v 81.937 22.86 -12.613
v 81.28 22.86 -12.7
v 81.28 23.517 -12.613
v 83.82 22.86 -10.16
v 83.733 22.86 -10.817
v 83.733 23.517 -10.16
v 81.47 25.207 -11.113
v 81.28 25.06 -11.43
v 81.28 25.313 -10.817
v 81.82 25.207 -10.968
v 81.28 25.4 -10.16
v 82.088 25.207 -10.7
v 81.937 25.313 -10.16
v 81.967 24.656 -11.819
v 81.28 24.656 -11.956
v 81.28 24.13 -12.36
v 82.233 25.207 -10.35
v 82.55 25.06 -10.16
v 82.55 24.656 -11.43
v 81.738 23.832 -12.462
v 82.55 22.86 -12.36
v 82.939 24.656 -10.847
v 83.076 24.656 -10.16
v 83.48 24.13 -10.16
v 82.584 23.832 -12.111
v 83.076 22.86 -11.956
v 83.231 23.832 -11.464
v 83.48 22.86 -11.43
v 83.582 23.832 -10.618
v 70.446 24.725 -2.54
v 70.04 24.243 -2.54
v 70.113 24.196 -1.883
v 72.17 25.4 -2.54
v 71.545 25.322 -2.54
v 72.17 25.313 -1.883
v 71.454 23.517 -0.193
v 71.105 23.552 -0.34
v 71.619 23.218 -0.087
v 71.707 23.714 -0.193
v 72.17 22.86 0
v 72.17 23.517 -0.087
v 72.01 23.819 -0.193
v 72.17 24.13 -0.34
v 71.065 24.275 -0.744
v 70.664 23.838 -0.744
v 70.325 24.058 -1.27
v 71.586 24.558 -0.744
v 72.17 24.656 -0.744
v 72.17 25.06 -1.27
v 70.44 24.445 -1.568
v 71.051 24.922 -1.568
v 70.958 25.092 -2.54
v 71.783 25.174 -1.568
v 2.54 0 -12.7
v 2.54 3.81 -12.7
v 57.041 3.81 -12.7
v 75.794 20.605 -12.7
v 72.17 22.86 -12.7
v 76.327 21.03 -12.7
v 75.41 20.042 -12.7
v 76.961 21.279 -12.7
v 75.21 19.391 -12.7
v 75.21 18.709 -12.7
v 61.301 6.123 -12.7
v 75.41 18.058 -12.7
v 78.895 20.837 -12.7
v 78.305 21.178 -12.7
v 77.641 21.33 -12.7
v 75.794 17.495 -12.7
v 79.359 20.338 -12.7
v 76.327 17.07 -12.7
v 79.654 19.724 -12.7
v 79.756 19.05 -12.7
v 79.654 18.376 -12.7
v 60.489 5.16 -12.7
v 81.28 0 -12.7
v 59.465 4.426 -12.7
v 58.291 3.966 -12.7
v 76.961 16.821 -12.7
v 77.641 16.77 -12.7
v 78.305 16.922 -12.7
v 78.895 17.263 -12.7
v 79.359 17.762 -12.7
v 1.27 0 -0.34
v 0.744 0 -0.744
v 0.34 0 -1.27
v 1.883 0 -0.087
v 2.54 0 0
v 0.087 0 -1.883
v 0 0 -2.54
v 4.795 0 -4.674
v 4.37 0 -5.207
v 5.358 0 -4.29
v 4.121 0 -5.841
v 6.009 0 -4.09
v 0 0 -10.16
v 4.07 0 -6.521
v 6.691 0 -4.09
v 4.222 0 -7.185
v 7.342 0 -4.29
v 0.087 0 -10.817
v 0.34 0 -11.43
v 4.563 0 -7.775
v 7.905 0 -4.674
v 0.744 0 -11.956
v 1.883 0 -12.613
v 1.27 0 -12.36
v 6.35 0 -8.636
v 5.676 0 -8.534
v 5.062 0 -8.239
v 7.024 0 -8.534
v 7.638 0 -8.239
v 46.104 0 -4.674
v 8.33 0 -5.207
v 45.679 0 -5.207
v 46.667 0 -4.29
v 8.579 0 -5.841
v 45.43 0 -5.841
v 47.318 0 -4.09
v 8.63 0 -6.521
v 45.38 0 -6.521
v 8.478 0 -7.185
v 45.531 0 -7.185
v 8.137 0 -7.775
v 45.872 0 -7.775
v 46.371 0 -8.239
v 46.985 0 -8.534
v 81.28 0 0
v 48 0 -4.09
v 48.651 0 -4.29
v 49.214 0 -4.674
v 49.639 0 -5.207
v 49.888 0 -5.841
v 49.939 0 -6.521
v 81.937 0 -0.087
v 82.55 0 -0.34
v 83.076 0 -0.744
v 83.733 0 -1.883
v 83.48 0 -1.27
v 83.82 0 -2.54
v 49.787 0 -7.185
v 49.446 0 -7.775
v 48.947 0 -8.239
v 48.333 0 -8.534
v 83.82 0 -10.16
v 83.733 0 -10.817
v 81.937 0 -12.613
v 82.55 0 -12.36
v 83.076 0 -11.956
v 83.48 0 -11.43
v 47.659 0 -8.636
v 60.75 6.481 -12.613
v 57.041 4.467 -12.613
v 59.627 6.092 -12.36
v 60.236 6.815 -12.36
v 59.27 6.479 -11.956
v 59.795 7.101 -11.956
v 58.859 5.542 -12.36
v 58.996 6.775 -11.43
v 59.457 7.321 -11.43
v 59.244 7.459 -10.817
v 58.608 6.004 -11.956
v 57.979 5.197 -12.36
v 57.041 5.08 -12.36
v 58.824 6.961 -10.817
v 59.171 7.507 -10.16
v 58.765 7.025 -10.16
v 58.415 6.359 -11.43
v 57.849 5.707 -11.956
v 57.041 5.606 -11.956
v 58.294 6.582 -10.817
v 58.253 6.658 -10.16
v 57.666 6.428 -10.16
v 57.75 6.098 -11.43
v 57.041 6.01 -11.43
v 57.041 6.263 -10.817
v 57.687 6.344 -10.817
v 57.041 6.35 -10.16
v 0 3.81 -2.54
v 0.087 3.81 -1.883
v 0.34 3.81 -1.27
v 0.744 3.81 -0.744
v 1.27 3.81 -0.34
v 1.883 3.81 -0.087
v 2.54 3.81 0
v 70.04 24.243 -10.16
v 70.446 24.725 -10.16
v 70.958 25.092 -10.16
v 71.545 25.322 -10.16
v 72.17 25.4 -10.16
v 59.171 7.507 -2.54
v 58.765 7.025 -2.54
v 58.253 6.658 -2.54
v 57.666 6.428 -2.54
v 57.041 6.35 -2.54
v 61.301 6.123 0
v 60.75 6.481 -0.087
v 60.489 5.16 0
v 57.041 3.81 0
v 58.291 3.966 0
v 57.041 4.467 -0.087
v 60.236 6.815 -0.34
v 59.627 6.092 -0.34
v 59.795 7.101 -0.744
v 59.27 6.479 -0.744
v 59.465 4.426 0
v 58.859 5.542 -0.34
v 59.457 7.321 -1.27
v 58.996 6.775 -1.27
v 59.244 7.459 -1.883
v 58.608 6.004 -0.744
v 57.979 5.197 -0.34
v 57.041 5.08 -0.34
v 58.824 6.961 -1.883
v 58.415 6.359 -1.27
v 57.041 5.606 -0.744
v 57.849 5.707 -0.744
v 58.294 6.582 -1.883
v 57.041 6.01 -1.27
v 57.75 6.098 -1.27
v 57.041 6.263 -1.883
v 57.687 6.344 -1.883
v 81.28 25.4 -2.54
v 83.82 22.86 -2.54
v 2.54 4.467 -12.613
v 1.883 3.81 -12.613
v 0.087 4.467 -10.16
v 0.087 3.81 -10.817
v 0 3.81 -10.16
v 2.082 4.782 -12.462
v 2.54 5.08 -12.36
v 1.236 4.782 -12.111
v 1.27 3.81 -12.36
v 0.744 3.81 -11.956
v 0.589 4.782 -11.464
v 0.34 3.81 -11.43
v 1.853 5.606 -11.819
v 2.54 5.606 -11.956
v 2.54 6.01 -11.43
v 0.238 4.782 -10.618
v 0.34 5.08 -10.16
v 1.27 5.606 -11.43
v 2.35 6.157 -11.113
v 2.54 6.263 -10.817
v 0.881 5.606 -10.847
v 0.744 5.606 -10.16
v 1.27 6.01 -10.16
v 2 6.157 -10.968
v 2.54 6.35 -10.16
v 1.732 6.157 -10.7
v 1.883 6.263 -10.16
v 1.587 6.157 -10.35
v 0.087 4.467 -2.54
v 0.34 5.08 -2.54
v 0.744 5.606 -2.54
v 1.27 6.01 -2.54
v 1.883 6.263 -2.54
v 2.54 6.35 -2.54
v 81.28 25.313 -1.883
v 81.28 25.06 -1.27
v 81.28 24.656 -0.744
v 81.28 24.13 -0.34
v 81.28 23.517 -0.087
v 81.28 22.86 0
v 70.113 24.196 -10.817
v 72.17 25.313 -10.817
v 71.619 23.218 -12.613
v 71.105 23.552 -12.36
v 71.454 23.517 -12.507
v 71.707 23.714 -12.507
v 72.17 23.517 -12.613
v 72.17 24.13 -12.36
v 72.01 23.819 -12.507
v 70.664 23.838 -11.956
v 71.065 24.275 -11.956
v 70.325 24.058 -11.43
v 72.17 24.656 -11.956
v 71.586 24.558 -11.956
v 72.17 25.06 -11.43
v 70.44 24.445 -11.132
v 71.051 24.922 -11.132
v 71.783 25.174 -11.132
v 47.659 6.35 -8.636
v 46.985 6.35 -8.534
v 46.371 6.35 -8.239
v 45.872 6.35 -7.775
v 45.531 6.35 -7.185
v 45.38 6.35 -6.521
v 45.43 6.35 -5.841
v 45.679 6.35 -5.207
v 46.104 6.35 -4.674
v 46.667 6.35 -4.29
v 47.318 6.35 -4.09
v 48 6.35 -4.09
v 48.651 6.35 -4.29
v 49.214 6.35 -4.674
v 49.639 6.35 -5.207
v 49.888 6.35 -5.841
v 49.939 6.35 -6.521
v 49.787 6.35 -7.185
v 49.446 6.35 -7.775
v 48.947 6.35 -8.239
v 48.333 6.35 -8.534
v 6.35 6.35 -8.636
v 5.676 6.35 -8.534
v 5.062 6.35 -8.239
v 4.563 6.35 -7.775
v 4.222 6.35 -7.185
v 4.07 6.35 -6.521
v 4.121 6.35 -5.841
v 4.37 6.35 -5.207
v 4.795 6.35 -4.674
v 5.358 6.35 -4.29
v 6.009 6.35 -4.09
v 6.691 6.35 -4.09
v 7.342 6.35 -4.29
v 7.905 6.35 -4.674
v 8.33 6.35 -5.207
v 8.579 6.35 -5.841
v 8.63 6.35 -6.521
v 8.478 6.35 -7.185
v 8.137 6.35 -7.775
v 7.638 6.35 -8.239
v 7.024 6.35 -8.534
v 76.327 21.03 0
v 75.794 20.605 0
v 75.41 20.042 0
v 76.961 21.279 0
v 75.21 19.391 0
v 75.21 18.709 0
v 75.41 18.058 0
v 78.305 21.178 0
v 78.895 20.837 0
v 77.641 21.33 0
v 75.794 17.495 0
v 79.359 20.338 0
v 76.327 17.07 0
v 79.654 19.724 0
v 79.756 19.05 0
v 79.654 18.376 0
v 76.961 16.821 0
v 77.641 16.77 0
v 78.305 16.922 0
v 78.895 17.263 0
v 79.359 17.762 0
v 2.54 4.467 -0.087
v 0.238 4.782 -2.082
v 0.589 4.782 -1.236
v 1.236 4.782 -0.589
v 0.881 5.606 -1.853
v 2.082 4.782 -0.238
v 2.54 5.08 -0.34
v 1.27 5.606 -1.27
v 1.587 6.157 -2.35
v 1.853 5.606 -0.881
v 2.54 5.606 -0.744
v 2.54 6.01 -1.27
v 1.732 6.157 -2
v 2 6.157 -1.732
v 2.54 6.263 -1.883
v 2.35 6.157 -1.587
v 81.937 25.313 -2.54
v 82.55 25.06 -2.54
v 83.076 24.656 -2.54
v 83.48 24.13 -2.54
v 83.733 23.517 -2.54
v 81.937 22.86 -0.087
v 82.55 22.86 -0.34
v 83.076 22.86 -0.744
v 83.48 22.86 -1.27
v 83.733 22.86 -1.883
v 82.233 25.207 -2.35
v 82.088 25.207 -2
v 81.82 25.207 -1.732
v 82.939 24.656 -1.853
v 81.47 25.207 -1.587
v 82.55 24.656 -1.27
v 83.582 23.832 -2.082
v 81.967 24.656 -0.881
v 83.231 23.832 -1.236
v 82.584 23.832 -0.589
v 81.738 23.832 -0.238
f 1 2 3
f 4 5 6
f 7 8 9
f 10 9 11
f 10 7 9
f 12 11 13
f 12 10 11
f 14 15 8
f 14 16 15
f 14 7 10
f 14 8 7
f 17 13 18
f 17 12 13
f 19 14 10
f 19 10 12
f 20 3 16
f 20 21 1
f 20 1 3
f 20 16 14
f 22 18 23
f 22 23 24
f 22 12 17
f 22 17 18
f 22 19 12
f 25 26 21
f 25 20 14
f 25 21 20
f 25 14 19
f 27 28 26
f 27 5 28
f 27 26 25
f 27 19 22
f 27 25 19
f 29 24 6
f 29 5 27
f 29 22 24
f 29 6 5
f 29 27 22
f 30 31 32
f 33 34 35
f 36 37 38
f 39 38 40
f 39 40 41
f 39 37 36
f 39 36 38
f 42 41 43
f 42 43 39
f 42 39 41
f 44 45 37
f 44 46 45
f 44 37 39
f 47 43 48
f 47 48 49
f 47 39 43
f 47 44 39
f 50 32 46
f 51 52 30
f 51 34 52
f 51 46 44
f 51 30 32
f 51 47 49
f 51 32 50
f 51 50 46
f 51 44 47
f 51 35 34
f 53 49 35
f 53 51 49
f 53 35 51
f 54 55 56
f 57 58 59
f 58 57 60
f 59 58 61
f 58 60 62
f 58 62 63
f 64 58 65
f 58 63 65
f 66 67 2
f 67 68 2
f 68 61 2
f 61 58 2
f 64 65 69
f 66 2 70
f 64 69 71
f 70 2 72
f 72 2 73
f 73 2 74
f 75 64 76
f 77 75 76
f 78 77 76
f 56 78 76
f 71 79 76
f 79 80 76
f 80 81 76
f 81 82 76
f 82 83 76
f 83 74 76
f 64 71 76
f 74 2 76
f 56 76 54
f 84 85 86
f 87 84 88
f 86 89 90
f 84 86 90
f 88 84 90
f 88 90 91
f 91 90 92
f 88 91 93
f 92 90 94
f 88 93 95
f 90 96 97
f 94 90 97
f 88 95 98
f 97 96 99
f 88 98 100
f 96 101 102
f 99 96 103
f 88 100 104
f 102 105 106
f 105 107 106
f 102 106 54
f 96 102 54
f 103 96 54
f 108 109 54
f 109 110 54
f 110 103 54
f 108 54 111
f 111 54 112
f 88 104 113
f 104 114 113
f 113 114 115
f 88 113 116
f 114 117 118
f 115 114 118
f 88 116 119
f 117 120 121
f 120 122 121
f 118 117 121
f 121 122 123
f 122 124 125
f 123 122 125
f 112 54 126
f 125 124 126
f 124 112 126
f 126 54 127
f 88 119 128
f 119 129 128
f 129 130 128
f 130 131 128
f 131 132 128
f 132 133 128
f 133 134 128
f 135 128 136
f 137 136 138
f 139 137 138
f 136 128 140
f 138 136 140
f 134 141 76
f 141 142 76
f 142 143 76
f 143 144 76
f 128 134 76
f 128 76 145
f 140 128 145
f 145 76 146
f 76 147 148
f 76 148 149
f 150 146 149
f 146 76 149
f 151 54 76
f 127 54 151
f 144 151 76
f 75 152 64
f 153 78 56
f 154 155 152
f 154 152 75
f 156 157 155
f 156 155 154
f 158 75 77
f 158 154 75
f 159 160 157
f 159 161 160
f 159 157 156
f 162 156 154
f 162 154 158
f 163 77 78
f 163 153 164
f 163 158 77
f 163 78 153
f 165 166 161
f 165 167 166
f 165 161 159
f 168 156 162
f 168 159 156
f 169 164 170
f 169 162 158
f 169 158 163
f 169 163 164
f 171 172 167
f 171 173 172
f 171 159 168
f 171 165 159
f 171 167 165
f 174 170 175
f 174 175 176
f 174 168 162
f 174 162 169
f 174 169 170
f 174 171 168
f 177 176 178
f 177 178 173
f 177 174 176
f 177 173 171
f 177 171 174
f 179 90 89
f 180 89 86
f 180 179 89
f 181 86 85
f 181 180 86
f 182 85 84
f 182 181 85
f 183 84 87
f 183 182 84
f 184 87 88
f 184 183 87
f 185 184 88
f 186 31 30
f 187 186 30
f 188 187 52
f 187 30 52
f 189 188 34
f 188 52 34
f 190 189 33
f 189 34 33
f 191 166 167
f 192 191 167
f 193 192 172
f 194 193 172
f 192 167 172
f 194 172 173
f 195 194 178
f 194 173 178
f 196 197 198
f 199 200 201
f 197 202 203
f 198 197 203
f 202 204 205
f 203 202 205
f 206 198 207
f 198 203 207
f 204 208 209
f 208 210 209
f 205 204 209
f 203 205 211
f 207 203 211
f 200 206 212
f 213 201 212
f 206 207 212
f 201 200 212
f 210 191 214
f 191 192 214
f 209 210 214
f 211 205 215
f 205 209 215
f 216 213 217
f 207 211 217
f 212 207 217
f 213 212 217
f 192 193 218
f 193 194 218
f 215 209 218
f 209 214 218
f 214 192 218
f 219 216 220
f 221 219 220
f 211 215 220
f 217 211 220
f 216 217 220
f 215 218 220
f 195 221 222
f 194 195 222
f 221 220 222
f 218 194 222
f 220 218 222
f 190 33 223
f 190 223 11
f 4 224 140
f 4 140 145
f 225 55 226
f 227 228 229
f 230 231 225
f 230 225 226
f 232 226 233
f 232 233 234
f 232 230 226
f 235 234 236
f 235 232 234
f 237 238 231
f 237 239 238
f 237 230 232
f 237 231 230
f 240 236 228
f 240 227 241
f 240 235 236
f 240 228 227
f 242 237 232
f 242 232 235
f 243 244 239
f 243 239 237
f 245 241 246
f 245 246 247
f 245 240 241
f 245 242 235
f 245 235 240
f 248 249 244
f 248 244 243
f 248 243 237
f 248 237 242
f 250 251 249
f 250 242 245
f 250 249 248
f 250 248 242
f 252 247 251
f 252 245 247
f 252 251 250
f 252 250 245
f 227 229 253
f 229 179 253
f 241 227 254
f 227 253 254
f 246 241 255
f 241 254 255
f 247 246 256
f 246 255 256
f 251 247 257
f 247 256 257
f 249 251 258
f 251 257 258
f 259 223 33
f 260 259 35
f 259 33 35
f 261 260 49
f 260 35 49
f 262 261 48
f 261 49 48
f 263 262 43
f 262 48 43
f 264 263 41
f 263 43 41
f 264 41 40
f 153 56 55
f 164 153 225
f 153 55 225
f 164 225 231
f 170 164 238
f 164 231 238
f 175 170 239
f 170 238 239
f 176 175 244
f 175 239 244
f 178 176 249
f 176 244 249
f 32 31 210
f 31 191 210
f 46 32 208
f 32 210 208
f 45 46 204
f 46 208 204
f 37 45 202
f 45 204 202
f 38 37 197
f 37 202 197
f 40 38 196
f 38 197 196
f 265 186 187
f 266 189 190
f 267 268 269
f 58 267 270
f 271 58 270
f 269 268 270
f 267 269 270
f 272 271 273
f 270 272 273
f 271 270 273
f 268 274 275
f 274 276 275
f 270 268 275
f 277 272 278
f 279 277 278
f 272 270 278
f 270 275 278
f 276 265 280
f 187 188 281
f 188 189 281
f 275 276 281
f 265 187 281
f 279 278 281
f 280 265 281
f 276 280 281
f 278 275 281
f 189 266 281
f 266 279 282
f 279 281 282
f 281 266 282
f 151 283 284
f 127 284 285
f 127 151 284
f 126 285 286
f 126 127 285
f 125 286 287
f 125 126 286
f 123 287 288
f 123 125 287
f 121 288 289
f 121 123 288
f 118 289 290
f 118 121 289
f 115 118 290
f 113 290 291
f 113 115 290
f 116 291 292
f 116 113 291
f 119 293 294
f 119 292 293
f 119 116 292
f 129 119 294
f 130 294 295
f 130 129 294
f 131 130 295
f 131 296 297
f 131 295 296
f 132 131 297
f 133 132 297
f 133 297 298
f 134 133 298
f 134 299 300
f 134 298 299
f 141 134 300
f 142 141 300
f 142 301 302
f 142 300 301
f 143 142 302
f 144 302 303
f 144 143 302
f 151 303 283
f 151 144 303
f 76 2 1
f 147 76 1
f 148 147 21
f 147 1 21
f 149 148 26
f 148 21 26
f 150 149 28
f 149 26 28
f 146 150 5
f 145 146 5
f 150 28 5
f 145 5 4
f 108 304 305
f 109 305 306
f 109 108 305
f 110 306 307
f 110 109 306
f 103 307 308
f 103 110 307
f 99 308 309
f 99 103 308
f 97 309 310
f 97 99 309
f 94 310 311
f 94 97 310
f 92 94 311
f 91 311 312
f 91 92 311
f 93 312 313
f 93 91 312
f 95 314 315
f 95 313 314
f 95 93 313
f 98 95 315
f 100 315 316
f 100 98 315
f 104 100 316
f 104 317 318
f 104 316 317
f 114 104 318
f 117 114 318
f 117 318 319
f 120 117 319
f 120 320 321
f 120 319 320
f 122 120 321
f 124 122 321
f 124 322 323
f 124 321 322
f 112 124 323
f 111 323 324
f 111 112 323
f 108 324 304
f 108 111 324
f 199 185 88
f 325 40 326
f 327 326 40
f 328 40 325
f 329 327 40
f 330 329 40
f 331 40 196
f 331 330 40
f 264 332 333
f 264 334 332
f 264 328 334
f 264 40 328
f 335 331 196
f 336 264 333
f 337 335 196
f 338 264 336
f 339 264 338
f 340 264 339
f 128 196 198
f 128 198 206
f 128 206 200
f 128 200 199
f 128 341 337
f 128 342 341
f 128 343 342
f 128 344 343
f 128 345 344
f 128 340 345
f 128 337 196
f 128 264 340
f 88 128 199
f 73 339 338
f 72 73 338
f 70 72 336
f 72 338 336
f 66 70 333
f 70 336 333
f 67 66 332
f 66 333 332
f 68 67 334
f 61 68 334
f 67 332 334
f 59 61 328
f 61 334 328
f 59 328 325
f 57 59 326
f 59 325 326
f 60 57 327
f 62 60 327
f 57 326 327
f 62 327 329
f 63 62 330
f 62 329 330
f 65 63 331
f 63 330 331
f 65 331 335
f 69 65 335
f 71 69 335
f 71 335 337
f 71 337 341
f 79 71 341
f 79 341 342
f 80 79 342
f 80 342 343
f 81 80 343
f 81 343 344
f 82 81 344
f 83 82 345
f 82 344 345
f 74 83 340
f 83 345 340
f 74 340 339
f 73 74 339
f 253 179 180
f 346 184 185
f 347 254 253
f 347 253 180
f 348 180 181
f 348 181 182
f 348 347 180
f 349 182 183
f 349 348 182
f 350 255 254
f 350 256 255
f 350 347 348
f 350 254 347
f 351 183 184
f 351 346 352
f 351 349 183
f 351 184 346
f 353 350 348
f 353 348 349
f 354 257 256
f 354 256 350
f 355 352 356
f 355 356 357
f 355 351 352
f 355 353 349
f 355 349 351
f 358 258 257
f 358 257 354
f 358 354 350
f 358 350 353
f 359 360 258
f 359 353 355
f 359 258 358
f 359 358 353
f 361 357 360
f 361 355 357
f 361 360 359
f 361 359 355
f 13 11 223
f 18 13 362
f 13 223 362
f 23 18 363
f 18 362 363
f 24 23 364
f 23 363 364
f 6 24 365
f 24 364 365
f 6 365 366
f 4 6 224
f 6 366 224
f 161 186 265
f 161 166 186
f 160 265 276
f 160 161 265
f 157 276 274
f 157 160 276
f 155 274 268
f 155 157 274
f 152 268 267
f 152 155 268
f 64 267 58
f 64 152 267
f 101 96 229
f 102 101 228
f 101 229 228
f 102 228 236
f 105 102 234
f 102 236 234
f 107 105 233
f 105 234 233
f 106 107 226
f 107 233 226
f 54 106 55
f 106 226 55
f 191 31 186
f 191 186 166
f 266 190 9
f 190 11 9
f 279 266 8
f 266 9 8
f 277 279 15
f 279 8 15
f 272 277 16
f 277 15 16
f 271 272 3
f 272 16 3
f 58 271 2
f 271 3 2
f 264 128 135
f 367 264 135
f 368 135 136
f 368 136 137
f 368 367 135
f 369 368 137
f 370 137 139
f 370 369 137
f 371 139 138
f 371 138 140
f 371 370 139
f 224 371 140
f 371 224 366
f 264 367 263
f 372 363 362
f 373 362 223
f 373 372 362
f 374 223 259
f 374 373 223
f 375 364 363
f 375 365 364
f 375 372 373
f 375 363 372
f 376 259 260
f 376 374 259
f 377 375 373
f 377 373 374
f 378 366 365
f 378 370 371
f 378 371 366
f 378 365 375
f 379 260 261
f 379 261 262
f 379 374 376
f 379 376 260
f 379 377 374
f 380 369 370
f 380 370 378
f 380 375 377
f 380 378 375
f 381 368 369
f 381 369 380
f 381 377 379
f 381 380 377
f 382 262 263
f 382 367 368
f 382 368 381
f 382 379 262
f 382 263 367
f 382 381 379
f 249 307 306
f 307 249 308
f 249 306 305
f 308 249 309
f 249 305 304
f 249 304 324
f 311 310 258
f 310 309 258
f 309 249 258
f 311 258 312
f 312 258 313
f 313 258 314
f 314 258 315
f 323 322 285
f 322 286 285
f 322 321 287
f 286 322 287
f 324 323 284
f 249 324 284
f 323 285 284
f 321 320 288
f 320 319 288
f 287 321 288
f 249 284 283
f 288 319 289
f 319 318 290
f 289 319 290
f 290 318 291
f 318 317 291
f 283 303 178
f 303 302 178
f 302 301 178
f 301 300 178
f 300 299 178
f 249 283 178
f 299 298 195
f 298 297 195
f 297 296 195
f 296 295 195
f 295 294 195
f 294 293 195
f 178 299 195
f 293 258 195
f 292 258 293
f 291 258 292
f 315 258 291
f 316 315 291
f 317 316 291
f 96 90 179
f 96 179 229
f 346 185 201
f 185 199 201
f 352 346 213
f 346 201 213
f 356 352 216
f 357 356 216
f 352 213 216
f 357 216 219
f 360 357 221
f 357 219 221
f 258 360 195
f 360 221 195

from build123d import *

# Parameters (mm, degrees)
SKETCH1_W           = 83.82
SKETCH1_H           = 12.7
SKETCH1_R           = 2.286
BOSS_EXTRUDE1_DEPTH = 25.4
SKETCH2_R           = 2.286
CUT_EXTRUDE1_DEPTH  = 12.7
FILLET1_R           = 2.54
SKETCH3_W           = 71.12
SKETCH3_H           = 19.05
CUT_EXTRUDE2_DEPTH  = 89.499957062
CHAMFER1_SIZE       = 19.55628504
CHAMFER1_SIZE_2     = 12.7
FILLET2_R           = 2.54


with BuildPart() as part:
    # Sketch1 → Boss-Extrude1 (new body)
    with BuildSketch(Plane(origin=(0, 0, 0), x_dir=(1, 0, 0), z_dir=(0, 1, 0))):
        with Locations((41.91, 6.35)):
            Rectangle(SKETCH1_W, SKETCH1_H)
        with Locations(Location((6.35, 6.35, 0), (0, 0, 90))):
            Circle(SKETCH1_R, mode=Mode.SUBTRACT)
        with Locations(Location((47.659178157, 6.35, 0), (0, 0, 90))):
            Circle(SKETCH1_R, mode=Mode.SUBTRACT)
    extrude(amount=BOSS_EXTRUDE1_DEPTH)

    # Sketch2 → Cut-Extrude1 (cut)
    with BuildSketch(Plane.XY):
        with Locations((77.47, 19.05)):
            Circle(SKETCH2_R)
    extrude(amount=-CUT_EXTRUDE1_DEPTH, mode=Mode.SUBTRACT)

    # Fillet1
    fillet1_edges = [part.edges().sort_by_distance(p)[0] for p in [
        (0, 12.7, -12.7),
        (83.82, 12.7, -12.7),
        (83.82, 12.7, 0),
        (0, 12.7, 0),
    ]]
    fillet(fillet1_edges, radius=FILLET1_R)

    # Sketch3 → Cut-Extrude2 (cut, through all)
    with BuildSketch(Plane.XY):
        with Locations((35.56, 15.875)):
            Rectangle(SKETCH3_W, SKETCH3_H)
    extrude(amount=-CUT_EXTRUDE2_DEPTH, mode=Mode.SUBTRACT)

    # Chamfer1
    # the kernel refuses this chamfer: 19.55628504, 12.7 mm, written as the material it adds along each edge
    with BuildSketch(Plane(origin=(71.12, 6.35, 0), x_dir=(0.021073765466273545, 0.9997779235455604, 0), z_dir=(0, 0, -1))) as chamfer1_piece_1_section:
        Polygon((CHAMFER1_SIZE * 0.999777923568, -CHAMFER1_SIZE * 0.0210737654668), (-CHAMFER1_SIZE_2 * 0.0210737654663, -CHAMFER1_SIZE_2 * 0.999777923546), (0, 0), align=None)
    chamfer1_piece_1 = extrude(amount=12.7, mode=Mode.PRIVATE)
    chamfer1_piece_1 = split(chamfer1_piece_1, bisect_by=Plane(origin=(66.98884067, 25.4, -6.35), z_dir=(0, -1, 0)), keep=Keep.TOP, mode=Mode.PRIVATE)
    add(chamfer1_piece_1)

    # Fillet2
    fillet2_edges = [part.edges().sort_by_distance(p)[0] for p in [
        (76.035607325, 25.4, -12.7),
        (83.82, 25.4, -6.35),
        (83.076051224, 25.4, -0.743948776),
        (83.076051224, 25.4, -11.956051224),
        (0.743948776, 6.35, -0.743948776),
        (76.035607325, 25.4, 0),
        (0, 6.35, -6.35),
        (0.743948776, 6.35, -11.956051224),
        (30.48, 6.35, -12.7),
        (30.48, 6.35, 0),
        (58.42, 6.35, -6.35),
        (70.79121465, 25.4, -6.35),
        (64.605607325, 15.875, 0),
        (64.605607325, 15.875, -12.7),
    ]]
    fillet(fillet2_edges, radius=FILLET2_R)


solid = part.part
